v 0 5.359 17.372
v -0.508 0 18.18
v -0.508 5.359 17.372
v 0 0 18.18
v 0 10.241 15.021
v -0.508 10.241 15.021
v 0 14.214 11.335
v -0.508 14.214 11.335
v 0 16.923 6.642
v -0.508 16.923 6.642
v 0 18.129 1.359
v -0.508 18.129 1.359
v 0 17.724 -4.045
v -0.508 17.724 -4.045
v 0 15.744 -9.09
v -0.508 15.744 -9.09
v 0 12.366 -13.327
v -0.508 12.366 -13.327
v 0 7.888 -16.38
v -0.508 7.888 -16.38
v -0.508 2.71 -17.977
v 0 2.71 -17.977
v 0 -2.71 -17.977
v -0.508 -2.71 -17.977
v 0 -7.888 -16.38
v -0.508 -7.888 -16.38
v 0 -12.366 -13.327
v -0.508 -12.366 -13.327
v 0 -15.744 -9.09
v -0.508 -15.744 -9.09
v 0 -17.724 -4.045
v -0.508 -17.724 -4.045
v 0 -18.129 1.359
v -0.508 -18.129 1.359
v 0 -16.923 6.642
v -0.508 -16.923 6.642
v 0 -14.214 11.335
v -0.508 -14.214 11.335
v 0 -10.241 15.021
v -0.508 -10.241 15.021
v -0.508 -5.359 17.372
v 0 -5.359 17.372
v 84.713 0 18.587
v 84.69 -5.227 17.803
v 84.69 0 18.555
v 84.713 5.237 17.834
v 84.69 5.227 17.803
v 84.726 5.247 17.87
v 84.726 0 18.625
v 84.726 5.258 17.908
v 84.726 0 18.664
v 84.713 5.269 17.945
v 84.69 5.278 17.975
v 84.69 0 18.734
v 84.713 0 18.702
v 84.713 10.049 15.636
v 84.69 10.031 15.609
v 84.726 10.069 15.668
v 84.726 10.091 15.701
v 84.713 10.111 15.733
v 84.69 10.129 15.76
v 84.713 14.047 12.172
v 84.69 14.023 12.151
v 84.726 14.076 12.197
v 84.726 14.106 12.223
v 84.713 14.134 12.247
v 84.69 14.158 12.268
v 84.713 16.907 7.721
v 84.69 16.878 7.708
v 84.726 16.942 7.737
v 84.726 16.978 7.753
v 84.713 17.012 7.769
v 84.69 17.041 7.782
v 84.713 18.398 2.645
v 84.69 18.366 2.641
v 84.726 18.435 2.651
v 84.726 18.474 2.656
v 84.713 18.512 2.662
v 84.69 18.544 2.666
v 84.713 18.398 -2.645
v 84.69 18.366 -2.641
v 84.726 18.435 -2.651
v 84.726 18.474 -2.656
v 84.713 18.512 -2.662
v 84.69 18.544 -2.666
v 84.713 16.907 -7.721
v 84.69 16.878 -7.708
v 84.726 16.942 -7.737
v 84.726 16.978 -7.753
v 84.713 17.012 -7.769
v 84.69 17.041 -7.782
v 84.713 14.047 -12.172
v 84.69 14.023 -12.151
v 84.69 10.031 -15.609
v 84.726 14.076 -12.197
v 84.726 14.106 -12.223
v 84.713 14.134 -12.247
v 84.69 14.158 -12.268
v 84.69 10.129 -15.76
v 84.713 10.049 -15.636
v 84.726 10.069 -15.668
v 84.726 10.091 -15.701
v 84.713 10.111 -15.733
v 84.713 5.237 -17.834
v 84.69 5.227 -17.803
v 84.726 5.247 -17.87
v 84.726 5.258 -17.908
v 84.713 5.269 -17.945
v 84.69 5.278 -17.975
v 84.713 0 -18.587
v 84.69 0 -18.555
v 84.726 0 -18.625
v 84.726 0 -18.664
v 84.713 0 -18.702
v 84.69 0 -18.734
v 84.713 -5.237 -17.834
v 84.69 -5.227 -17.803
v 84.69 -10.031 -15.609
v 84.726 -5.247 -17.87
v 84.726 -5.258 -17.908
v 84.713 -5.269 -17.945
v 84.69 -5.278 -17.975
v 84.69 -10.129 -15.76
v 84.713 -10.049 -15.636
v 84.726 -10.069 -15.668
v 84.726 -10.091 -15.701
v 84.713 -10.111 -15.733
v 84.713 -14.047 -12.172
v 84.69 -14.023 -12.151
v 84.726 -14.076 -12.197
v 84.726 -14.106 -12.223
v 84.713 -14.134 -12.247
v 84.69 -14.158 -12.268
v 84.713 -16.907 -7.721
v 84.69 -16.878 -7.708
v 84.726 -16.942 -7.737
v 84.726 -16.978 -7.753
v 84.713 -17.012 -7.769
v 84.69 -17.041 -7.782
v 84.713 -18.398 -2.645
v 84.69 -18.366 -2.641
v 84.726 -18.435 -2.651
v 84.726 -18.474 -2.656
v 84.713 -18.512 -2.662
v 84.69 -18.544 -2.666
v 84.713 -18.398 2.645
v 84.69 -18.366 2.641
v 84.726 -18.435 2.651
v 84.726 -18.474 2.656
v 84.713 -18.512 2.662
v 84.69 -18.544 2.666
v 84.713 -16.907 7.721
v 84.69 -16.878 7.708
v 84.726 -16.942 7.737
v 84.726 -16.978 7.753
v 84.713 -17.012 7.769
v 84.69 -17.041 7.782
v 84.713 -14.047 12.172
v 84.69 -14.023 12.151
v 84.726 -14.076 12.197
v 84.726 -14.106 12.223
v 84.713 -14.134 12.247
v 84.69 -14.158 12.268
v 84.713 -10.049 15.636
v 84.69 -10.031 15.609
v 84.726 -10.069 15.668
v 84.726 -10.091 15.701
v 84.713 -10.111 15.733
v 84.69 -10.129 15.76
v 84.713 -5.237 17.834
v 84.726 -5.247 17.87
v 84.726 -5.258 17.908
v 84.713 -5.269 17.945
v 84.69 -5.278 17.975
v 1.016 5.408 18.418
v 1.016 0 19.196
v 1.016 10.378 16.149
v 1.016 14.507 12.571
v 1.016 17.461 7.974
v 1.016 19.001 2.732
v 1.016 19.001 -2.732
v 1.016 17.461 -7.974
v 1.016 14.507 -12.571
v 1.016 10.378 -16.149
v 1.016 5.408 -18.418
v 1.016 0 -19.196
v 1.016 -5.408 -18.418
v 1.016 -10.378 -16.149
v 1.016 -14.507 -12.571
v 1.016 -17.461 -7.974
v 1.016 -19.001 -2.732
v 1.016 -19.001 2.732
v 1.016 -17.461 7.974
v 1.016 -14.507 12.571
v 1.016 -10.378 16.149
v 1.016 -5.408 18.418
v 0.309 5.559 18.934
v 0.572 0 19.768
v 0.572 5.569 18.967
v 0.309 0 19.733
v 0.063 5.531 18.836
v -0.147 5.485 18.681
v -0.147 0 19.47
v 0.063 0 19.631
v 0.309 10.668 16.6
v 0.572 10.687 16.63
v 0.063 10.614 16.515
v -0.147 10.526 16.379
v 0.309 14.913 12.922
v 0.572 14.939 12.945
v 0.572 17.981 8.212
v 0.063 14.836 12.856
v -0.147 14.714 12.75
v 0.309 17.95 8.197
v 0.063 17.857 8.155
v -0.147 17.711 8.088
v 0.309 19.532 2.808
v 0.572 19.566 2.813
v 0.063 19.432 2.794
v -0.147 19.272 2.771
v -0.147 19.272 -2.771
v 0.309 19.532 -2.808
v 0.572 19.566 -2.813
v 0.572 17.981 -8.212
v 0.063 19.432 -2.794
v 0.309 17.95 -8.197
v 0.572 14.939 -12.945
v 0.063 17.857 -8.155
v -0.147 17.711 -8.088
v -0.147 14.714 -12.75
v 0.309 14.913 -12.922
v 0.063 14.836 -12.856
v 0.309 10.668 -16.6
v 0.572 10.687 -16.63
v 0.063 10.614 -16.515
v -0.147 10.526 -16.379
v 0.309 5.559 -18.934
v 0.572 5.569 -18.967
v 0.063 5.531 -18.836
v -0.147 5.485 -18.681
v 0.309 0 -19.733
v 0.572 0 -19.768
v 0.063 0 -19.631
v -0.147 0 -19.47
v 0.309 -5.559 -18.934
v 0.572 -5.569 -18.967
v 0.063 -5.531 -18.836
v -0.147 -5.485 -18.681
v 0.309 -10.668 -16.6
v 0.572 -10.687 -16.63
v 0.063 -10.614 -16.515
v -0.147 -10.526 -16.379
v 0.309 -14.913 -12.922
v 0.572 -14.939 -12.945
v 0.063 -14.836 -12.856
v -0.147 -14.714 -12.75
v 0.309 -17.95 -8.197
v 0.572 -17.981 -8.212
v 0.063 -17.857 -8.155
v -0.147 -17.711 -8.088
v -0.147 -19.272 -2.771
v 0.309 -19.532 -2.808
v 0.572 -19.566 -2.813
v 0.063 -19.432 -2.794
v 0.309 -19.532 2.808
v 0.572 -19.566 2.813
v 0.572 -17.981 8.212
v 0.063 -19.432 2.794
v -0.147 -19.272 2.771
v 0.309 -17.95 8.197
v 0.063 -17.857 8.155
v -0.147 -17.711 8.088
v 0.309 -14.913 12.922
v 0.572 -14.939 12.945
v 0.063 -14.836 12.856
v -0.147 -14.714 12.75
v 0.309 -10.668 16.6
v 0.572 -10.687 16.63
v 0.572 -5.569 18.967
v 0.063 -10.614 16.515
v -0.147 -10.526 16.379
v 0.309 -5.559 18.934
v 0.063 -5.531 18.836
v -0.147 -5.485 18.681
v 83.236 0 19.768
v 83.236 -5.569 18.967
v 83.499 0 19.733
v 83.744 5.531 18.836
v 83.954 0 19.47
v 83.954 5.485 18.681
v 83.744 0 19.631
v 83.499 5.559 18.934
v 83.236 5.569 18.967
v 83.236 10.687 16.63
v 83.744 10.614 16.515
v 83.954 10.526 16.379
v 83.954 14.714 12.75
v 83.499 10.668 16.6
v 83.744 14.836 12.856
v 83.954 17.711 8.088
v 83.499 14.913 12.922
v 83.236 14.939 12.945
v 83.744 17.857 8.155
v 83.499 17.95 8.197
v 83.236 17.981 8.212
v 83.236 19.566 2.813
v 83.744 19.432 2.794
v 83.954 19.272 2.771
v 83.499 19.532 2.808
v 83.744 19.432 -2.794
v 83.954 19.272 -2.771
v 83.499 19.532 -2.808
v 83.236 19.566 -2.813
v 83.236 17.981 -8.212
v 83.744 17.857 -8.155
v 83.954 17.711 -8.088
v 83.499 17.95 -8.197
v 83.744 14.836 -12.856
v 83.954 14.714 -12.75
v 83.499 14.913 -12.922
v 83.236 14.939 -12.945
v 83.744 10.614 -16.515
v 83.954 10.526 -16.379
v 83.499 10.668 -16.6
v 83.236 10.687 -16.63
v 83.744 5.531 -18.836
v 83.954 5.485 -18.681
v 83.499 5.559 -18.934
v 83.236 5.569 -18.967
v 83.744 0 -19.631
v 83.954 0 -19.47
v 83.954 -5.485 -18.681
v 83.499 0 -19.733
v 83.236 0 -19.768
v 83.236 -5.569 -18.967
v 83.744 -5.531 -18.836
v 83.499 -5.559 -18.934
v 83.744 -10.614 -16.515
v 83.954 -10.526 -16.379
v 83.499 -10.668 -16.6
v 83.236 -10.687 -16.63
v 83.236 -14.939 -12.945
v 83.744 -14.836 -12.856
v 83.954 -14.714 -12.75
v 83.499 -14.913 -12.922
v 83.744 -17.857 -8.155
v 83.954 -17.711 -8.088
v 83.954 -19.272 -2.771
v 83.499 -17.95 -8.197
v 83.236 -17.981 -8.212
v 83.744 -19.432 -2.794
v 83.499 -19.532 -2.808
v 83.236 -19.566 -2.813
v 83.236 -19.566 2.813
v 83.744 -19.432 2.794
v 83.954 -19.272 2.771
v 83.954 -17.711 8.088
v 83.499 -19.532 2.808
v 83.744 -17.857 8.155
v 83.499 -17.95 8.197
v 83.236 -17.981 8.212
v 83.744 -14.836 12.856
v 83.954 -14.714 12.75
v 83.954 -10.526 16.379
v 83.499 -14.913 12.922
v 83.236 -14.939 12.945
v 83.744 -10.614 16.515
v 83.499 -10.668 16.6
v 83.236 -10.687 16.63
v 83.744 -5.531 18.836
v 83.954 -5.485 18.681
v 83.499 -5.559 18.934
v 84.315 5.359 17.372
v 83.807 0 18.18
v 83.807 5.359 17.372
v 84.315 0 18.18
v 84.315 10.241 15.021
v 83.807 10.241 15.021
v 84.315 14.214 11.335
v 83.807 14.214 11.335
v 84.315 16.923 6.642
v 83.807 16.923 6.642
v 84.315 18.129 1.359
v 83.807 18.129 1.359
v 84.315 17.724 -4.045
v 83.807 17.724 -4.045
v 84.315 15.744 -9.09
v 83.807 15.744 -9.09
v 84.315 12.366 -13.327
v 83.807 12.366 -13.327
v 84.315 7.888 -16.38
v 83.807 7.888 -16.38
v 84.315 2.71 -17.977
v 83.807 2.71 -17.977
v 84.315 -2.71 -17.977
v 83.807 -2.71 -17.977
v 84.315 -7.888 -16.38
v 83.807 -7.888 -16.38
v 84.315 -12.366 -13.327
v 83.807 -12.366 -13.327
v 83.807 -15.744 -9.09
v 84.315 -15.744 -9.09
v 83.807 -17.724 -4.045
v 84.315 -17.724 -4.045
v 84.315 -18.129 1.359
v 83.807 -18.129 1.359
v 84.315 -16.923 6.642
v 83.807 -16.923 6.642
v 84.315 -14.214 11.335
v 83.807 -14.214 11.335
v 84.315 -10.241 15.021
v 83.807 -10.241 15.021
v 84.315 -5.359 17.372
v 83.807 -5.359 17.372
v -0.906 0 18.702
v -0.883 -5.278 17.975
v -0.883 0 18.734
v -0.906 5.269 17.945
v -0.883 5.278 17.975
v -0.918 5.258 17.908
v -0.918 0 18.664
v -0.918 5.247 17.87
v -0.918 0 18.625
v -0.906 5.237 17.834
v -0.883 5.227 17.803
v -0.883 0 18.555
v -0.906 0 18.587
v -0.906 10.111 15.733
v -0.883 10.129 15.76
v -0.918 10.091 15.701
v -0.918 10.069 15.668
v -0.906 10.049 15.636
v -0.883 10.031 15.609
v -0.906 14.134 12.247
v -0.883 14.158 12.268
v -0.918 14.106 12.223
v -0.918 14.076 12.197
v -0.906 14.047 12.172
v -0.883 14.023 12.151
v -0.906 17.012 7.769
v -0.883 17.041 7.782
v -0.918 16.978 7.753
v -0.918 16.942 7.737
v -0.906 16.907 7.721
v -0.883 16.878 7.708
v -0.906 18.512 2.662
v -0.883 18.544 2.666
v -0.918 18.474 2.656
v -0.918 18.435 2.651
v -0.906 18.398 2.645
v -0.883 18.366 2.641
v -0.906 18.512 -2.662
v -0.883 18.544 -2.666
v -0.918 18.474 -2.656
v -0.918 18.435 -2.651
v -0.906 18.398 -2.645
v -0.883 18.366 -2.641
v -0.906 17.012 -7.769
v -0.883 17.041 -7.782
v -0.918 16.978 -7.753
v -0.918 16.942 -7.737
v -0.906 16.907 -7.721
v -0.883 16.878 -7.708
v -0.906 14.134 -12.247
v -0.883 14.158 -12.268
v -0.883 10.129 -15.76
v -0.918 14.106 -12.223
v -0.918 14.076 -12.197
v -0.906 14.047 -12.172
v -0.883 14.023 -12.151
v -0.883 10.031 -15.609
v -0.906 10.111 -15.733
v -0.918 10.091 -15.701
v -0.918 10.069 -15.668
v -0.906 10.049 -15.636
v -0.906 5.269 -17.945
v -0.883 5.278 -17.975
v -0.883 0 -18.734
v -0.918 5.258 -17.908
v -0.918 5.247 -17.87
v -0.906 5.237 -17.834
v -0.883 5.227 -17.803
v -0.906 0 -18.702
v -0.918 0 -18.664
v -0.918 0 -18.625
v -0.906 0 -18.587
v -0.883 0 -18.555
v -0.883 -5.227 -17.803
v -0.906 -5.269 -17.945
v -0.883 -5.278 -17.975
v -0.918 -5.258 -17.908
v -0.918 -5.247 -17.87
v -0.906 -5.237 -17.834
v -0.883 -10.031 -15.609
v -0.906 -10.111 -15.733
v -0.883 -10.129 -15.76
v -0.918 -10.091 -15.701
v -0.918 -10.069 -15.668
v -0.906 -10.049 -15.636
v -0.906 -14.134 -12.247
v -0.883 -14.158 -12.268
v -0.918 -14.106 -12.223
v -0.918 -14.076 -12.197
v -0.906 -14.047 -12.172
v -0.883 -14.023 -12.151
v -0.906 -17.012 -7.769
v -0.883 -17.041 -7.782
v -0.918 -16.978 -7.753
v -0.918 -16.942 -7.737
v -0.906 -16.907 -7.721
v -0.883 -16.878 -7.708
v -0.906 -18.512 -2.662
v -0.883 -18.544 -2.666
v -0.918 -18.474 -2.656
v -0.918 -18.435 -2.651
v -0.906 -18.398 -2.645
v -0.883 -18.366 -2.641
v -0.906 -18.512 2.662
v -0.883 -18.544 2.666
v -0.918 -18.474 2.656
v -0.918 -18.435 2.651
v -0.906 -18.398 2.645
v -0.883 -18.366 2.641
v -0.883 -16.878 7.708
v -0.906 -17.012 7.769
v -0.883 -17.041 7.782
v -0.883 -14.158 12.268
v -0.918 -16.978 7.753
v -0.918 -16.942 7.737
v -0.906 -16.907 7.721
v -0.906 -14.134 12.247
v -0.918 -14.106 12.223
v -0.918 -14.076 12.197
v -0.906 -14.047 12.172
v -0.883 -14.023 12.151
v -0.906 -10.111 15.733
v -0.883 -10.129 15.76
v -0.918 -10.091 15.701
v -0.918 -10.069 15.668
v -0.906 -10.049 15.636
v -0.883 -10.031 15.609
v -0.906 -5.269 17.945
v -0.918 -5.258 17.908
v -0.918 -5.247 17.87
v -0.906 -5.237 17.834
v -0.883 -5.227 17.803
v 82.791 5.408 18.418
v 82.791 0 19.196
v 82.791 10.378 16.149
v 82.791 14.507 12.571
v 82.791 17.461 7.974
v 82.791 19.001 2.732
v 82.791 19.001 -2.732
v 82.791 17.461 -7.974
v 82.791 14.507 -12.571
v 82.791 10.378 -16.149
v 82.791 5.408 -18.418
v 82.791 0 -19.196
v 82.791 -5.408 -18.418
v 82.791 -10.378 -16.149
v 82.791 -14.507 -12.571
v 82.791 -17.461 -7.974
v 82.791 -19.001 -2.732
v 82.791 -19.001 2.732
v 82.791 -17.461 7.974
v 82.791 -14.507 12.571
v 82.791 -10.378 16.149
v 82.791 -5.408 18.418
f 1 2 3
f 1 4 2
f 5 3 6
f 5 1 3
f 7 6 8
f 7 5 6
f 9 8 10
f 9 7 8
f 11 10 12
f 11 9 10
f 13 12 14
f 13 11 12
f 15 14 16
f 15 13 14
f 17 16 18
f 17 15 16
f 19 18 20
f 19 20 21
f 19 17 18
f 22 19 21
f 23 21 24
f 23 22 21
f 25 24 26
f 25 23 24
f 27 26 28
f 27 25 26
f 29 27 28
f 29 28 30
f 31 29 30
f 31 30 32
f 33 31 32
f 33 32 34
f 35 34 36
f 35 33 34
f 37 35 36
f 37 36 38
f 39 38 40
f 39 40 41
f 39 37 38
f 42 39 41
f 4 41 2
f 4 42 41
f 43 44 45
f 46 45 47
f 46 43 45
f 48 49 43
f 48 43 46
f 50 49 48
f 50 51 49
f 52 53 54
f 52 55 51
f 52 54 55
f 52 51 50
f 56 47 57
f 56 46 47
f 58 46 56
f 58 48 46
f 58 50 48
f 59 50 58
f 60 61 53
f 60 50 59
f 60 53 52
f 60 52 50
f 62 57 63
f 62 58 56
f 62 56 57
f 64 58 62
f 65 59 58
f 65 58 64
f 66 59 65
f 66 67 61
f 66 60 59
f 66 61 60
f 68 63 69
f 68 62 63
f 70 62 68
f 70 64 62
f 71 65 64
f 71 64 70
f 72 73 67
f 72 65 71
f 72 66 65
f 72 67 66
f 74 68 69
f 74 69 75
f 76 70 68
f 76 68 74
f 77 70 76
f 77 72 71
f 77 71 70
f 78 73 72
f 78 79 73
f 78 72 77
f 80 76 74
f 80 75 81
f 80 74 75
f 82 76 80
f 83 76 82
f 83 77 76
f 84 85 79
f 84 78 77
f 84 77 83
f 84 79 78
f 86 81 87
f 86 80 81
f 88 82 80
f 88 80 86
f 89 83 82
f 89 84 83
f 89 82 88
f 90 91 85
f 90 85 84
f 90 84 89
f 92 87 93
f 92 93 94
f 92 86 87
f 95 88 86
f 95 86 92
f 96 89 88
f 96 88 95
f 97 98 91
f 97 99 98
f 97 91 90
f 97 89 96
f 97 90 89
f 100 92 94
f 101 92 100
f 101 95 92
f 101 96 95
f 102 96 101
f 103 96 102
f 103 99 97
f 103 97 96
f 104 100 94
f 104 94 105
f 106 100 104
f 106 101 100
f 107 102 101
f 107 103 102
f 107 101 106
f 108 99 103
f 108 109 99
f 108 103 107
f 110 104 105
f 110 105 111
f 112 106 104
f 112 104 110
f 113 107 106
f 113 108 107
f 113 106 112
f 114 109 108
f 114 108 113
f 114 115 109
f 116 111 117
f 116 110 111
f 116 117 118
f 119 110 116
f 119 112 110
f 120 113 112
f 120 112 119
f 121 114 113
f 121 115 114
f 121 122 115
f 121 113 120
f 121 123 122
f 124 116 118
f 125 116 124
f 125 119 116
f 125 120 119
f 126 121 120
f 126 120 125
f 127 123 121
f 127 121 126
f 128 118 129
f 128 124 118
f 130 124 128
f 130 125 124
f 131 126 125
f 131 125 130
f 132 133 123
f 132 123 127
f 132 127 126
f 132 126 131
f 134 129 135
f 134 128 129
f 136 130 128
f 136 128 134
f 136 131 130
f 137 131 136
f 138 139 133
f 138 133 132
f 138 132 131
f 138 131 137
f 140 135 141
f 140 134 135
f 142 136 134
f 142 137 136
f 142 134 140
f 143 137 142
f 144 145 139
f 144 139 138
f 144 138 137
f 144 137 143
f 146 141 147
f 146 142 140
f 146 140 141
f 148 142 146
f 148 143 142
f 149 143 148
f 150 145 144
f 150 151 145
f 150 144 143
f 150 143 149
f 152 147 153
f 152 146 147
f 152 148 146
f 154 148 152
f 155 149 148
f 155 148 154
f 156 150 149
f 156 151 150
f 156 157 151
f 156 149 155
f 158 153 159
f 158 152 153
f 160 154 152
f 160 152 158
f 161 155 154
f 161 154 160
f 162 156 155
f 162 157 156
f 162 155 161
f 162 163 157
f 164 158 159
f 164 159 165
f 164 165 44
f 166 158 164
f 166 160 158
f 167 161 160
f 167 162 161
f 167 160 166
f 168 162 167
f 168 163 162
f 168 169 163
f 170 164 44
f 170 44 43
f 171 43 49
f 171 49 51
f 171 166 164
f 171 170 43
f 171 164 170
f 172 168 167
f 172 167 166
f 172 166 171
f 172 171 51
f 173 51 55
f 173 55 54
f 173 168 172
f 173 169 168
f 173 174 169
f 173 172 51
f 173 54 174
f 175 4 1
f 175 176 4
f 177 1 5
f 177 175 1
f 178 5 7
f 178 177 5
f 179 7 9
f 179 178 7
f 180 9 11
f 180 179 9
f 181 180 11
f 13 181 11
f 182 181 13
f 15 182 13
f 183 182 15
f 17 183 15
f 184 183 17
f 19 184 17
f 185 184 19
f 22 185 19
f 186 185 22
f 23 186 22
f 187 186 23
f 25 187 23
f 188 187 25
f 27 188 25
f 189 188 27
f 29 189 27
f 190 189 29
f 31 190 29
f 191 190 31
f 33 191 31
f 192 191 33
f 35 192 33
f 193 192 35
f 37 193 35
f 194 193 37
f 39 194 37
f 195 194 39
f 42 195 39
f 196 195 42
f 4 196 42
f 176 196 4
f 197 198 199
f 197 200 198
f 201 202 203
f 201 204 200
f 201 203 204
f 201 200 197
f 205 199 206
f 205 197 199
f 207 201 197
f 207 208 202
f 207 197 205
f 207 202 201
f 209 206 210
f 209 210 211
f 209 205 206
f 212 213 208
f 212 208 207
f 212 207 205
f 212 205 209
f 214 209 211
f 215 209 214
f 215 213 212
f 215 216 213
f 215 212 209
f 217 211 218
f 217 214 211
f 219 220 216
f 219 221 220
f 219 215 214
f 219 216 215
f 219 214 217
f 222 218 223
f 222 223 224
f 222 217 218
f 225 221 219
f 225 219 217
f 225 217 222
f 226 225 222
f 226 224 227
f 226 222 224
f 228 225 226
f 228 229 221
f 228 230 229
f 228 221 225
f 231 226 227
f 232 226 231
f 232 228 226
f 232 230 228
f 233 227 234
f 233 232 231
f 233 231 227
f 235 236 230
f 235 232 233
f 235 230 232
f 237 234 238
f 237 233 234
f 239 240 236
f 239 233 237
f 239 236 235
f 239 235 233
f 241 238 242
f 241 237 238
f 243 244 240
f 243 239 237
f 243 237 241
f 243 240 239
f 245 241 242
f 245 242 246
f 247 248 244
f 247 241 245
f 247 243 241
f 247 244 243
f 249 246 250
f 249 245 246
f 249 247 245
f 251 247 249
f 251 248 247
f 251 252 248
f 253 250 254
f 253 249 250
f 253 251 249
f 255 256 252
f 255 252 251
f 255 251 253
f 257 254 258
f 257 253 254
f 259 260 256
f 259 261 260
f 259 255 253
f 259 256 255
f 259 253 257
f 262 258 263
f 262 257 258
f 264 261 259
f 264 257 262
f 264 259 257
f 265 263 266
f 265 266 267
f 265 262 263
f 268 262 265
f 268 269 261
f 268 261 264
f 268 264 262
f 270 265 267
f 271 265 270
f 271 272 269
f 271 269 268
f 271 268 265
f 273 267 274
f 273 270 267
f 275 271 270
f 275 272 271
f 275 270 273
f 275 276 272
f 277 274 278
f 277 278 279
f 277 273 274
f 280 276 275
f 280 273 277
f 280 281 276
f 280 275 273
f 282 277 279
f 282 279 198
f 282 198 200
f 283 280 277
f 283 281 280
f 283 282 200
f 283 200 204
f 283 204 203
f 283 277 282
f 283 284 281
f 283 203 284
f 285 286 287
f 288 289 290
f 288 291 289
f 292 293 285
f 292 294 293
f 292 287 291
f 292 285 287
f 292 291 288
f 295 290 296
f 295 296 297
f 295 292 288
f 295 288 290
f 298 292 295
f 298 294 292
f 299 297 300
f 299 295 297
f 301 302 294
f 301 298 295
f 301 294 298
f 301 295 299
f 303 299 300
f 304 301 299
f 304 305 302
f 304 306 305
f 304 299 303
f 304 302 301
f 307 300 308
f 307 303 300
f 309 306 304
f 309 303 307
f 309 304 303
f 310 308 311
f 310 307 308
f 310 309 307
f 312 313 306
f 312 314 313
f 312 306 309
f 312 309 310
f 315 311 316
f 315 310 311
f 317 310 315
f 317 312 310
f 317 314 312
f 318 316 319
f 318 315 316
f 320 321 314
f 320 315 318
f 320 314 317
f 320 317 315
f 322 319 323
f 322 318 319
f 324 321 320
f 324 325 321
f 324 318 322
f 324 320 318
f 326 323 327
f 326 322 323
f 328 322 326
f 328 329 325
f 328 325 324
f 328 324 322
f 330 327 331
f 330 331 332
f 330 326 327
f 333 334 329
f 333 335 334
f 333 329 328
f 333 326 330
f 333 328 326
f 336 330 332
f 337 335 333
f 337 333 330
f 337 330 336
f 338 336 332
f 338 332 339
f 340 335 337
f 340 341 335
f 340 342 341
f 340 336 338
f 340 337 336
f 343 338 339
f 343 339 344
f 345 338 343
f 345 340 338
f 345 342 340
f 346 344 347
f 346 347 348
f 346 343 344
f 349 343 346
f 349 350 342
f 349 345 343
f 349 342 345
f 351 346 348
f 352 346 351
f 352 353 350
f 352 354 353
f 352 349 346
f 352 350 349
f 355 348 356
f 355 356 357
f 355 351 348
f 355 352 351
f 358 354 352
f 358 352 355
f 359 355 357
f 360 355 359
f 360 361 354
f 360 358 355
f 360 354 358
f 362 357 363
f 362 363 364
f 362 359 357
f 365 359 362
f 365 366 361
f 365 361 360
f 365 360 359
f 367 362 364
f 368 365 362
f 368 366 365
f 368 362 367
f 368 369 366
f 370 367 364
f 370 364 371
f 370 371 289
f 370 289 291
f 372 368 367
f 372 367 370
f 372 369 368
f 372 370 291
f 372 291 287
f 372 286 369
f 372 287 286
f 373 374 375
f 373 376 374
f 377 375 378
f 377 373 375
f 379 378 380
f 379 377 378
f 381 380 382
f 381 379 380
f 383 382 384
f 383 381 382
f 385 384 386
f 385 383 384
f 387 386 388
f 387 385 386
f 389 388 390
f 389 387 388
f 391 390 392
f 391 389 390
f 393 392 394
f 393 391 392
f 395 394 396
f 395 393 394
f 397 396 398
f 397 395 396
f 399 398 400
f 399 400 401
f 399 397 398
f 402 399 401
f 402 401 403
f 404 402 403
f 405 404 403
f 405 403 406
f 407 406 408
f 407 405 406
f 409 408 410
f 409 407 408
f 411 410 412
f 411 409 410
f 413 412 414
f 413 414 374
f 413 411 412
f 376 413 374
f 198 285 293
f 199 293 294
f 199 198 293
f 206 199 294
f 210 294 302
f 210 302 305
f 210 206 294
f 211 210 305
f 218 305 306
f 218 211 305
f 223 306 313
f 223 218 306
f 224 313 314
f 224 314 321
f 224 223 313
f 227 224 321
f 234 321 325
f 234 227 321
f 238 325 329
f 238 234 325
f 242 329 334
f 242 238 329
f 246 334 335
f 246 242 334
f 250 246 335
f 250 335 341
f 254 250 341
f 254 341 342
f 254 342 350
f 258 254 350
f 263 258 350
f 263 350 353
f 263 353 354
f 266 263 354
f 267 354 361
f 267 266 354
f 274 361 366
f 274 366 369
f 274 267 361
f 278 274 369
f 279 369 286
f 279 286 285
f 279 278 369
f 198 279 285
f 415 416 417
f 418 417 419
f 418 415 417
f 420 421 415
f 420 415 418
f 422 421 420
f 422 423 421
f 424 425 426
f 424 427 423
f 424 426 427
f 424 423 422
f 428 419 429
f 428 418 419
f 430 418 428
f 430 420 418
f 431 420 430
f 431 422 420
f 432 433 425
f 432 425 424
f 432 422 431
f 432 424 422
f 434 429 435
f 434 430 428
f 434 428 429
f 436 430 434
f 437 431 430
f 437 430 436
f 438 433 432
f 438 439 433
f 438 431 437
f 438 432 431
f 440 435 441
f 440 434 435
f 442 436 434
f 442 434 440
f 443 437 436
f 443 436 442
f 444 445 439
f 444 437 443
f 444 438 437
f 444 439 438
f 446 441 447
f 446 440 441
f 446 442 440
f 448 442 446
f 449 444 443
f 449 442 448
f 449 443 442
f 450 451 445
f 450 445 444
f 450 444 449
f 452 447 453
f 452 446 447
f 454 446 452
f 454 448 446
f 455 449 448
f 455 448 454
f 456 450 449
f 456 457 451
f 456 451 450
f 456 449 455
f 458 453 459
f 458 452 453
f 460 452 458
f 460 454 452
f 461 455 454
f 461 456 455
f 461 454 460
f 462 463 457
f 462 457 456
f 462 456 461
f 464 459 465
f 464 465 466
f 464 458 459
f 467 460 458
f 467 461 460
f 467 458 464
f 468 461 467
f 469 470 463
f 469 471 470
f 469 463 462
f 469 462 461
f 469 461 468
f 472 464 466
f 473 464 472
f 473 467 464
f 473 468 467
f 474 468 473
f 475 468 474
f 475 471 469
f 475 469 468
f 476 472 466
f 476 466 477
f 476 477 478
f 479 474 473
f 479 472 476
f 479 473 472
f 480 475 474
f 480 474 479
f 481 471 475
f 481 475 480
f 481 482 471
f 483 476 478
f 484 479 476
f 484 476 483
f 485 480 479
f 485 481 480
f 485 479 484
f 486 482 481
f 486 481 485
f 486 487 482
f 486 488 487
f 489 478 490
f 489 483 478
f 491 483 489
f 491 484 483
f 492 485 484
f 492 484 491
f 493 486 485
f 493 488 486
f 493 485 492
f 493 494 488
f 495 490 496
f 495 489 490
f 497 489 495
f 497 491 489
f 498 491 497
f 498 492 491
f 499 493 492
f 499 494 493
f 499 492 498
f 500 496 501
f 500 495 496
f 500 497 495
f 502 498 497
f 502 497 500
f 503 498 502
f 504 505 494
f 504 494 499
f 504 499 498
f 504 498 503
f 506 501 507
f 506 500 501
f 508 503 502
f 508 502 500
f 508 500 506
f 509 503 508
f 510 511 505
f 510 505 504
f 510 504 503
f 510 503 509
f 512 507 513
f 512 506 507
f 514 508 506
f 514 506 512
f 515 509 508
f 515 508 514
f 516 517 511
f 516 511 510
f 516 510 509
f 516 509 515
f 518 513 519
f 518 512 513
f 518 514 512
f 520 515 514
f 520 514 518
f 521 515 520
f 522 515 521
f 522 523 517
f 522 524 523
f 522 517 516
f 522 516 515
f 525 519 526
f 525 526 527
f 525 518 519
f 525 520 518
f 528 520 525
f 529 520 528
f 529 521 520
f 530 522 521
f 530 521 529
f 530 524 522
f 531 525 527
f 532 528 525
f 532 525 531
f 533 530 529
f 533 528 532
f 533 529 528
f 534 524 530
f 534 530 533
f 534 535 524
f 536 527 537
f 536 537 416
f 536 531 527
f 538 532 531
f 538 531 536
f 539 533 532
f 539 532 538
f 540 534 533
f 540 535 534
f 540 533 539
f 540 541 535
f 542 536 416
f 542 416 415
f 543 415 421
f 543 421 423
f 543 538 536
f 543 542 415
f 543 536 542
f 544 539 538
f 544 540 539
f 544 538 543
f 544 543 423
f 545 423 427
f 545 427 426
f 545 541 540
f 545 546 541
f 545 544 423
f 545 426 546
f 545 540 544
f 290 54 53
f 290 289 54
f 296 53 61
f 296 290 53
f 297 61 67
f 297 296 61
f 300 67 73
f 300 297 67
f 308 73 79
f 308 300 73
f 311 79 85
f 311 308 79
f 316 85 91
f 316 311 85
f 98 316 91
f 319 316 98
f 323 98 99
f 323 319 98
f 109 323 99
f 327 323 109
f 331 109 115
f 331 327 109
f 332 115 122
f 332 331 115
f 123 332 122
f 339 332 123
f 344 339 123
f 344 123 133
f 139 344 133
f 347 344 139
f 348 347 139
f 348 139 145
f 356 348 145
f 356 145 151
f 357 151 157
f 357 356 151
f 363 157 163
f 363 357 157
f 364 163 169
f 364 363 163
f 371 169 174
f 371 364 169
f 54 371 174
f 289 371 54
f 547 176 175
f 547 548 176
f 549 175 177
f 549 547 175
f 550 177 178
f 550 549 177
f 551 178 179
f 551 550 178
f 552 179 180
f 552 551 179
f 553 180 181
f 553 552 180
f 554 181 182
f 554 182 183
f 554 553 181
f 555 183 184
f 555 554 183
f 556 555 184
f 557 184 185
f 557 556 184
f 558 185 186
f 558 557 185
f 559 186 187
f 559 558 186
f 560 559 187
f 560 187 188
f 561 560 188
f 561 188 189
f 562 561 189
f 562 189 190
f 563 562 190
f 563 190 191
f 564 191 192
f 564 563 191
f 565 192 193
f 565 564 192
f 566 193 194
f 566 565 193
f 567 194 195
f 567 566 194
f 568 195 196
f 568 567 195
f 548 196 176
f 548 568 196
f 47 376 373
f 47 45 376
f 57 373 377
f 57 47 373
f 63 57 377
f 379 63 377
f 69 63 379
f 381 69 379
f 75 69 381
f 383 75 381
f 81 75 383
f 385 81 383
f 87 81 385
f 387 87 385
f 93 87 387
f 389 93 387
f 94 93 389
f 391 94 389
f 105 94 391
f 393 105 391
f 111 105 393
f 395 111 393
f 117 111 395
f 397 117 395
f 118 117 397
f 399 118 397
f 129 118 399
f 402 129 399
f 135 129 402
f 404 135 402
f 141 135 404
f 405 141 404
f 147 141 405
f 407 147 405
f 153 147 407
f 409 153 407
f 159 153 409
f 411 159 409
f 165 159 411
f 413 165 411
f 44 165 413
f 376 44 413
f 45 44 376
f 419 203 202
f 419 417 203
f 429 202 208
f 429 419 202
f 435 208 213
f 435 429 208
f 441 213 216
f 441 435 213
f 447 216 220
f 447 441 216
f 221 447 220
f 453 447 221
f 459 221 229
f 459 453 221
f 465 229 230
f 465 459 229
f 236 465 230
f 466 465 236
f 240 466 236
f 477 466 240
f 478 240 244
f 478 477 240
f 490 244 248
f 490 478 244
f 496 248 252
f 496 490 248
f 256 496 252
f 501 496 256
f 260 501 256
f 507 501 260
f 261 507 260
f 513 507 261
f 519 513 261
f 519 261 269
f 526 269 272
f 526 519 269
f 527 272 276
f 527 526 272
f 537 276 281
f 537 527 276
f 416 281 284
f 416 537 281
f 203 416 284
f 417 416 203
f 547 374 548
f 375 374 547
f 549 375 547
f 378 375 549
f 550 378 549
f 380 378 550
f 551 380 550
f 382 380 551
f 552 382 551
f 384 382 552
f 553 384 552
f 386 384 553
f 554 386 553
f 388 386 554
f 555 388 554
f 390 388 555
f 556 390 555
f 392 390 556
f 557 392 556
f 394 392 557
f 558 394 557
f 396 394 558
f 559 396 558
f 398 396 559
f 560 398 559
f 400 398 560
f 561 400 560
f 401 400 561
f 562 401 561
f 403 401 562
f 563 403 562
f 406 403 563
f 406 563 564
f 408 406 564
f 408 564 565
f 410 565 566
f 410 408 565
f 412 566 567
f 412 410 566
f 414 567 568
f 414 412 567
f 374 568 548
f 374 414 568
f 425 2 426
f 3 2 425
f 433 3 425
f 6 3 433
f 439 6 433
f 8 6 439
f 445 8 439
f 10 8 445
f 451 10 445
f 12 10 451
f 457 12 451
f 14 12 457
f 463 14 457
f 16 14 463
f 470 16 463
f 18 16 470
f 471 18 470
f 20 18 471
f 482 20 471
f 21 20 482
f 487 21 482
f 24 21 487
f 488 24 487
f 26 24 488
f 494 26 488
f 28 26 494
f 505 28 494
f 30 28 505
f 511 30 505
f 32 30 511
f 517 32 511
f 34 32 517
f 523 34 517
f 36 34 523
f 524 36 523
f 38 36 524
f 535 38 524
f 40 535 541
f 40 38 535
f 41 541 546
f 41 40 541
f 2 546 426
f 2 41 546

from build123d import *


with BuildPart() as part:
    # Sketch1 → Revolve1 (revolve)
    with BuildSketch(Plane.XY):
        with BuildLine():
            Line((-0.882617928, 18.554667928), (-0.508, 18.18005))
            Line((-0.508, 18.18005), (0, 18.18005))
            Line((0, 18.18005), (1.016, 19.19605))
            Line((1.016, 19.19605), (82.7913, 19.19605))
            Line((82.7913, 19.19605), (83.8073, 18.18005))
            Line((83.8073, 18.18005), (84.3153, 18.18005))
            Line((84.3153, 18.18005), (84.689917928, 18.554667928))
            ThreePointArc((84.689917928, 18.554667928), (84.727115367, 18.64447049), (84.689917928, 18.734273051))
            Line((84.689917928, 18.734273051), (83.95422049, 19.46997049))
            ThreePointArc((83.95422049, 19.46997049), (83.624606367, 19.690211605), (83.2358, 19.76755))
            Line((83.2358, 19.76755), (0.5715, 19.76755))
            ThreePointArc((0.5715, 19.76755), (0.182693633, 19.690211605), (-0.14692049, 19.46997049))
            Line((-0.14692049, 19.46997049), (-0.882617928, 18.734273051))
            ThreePointArc((-0.882617928, 18.734273051), (-0.919815367, 18.64447049), (-0.882617928, 18.554667928))
        make_face()
    revolve(axis=Axis((83.8073, 0, 0), (-1, 0, 0)))


solid = part.part
